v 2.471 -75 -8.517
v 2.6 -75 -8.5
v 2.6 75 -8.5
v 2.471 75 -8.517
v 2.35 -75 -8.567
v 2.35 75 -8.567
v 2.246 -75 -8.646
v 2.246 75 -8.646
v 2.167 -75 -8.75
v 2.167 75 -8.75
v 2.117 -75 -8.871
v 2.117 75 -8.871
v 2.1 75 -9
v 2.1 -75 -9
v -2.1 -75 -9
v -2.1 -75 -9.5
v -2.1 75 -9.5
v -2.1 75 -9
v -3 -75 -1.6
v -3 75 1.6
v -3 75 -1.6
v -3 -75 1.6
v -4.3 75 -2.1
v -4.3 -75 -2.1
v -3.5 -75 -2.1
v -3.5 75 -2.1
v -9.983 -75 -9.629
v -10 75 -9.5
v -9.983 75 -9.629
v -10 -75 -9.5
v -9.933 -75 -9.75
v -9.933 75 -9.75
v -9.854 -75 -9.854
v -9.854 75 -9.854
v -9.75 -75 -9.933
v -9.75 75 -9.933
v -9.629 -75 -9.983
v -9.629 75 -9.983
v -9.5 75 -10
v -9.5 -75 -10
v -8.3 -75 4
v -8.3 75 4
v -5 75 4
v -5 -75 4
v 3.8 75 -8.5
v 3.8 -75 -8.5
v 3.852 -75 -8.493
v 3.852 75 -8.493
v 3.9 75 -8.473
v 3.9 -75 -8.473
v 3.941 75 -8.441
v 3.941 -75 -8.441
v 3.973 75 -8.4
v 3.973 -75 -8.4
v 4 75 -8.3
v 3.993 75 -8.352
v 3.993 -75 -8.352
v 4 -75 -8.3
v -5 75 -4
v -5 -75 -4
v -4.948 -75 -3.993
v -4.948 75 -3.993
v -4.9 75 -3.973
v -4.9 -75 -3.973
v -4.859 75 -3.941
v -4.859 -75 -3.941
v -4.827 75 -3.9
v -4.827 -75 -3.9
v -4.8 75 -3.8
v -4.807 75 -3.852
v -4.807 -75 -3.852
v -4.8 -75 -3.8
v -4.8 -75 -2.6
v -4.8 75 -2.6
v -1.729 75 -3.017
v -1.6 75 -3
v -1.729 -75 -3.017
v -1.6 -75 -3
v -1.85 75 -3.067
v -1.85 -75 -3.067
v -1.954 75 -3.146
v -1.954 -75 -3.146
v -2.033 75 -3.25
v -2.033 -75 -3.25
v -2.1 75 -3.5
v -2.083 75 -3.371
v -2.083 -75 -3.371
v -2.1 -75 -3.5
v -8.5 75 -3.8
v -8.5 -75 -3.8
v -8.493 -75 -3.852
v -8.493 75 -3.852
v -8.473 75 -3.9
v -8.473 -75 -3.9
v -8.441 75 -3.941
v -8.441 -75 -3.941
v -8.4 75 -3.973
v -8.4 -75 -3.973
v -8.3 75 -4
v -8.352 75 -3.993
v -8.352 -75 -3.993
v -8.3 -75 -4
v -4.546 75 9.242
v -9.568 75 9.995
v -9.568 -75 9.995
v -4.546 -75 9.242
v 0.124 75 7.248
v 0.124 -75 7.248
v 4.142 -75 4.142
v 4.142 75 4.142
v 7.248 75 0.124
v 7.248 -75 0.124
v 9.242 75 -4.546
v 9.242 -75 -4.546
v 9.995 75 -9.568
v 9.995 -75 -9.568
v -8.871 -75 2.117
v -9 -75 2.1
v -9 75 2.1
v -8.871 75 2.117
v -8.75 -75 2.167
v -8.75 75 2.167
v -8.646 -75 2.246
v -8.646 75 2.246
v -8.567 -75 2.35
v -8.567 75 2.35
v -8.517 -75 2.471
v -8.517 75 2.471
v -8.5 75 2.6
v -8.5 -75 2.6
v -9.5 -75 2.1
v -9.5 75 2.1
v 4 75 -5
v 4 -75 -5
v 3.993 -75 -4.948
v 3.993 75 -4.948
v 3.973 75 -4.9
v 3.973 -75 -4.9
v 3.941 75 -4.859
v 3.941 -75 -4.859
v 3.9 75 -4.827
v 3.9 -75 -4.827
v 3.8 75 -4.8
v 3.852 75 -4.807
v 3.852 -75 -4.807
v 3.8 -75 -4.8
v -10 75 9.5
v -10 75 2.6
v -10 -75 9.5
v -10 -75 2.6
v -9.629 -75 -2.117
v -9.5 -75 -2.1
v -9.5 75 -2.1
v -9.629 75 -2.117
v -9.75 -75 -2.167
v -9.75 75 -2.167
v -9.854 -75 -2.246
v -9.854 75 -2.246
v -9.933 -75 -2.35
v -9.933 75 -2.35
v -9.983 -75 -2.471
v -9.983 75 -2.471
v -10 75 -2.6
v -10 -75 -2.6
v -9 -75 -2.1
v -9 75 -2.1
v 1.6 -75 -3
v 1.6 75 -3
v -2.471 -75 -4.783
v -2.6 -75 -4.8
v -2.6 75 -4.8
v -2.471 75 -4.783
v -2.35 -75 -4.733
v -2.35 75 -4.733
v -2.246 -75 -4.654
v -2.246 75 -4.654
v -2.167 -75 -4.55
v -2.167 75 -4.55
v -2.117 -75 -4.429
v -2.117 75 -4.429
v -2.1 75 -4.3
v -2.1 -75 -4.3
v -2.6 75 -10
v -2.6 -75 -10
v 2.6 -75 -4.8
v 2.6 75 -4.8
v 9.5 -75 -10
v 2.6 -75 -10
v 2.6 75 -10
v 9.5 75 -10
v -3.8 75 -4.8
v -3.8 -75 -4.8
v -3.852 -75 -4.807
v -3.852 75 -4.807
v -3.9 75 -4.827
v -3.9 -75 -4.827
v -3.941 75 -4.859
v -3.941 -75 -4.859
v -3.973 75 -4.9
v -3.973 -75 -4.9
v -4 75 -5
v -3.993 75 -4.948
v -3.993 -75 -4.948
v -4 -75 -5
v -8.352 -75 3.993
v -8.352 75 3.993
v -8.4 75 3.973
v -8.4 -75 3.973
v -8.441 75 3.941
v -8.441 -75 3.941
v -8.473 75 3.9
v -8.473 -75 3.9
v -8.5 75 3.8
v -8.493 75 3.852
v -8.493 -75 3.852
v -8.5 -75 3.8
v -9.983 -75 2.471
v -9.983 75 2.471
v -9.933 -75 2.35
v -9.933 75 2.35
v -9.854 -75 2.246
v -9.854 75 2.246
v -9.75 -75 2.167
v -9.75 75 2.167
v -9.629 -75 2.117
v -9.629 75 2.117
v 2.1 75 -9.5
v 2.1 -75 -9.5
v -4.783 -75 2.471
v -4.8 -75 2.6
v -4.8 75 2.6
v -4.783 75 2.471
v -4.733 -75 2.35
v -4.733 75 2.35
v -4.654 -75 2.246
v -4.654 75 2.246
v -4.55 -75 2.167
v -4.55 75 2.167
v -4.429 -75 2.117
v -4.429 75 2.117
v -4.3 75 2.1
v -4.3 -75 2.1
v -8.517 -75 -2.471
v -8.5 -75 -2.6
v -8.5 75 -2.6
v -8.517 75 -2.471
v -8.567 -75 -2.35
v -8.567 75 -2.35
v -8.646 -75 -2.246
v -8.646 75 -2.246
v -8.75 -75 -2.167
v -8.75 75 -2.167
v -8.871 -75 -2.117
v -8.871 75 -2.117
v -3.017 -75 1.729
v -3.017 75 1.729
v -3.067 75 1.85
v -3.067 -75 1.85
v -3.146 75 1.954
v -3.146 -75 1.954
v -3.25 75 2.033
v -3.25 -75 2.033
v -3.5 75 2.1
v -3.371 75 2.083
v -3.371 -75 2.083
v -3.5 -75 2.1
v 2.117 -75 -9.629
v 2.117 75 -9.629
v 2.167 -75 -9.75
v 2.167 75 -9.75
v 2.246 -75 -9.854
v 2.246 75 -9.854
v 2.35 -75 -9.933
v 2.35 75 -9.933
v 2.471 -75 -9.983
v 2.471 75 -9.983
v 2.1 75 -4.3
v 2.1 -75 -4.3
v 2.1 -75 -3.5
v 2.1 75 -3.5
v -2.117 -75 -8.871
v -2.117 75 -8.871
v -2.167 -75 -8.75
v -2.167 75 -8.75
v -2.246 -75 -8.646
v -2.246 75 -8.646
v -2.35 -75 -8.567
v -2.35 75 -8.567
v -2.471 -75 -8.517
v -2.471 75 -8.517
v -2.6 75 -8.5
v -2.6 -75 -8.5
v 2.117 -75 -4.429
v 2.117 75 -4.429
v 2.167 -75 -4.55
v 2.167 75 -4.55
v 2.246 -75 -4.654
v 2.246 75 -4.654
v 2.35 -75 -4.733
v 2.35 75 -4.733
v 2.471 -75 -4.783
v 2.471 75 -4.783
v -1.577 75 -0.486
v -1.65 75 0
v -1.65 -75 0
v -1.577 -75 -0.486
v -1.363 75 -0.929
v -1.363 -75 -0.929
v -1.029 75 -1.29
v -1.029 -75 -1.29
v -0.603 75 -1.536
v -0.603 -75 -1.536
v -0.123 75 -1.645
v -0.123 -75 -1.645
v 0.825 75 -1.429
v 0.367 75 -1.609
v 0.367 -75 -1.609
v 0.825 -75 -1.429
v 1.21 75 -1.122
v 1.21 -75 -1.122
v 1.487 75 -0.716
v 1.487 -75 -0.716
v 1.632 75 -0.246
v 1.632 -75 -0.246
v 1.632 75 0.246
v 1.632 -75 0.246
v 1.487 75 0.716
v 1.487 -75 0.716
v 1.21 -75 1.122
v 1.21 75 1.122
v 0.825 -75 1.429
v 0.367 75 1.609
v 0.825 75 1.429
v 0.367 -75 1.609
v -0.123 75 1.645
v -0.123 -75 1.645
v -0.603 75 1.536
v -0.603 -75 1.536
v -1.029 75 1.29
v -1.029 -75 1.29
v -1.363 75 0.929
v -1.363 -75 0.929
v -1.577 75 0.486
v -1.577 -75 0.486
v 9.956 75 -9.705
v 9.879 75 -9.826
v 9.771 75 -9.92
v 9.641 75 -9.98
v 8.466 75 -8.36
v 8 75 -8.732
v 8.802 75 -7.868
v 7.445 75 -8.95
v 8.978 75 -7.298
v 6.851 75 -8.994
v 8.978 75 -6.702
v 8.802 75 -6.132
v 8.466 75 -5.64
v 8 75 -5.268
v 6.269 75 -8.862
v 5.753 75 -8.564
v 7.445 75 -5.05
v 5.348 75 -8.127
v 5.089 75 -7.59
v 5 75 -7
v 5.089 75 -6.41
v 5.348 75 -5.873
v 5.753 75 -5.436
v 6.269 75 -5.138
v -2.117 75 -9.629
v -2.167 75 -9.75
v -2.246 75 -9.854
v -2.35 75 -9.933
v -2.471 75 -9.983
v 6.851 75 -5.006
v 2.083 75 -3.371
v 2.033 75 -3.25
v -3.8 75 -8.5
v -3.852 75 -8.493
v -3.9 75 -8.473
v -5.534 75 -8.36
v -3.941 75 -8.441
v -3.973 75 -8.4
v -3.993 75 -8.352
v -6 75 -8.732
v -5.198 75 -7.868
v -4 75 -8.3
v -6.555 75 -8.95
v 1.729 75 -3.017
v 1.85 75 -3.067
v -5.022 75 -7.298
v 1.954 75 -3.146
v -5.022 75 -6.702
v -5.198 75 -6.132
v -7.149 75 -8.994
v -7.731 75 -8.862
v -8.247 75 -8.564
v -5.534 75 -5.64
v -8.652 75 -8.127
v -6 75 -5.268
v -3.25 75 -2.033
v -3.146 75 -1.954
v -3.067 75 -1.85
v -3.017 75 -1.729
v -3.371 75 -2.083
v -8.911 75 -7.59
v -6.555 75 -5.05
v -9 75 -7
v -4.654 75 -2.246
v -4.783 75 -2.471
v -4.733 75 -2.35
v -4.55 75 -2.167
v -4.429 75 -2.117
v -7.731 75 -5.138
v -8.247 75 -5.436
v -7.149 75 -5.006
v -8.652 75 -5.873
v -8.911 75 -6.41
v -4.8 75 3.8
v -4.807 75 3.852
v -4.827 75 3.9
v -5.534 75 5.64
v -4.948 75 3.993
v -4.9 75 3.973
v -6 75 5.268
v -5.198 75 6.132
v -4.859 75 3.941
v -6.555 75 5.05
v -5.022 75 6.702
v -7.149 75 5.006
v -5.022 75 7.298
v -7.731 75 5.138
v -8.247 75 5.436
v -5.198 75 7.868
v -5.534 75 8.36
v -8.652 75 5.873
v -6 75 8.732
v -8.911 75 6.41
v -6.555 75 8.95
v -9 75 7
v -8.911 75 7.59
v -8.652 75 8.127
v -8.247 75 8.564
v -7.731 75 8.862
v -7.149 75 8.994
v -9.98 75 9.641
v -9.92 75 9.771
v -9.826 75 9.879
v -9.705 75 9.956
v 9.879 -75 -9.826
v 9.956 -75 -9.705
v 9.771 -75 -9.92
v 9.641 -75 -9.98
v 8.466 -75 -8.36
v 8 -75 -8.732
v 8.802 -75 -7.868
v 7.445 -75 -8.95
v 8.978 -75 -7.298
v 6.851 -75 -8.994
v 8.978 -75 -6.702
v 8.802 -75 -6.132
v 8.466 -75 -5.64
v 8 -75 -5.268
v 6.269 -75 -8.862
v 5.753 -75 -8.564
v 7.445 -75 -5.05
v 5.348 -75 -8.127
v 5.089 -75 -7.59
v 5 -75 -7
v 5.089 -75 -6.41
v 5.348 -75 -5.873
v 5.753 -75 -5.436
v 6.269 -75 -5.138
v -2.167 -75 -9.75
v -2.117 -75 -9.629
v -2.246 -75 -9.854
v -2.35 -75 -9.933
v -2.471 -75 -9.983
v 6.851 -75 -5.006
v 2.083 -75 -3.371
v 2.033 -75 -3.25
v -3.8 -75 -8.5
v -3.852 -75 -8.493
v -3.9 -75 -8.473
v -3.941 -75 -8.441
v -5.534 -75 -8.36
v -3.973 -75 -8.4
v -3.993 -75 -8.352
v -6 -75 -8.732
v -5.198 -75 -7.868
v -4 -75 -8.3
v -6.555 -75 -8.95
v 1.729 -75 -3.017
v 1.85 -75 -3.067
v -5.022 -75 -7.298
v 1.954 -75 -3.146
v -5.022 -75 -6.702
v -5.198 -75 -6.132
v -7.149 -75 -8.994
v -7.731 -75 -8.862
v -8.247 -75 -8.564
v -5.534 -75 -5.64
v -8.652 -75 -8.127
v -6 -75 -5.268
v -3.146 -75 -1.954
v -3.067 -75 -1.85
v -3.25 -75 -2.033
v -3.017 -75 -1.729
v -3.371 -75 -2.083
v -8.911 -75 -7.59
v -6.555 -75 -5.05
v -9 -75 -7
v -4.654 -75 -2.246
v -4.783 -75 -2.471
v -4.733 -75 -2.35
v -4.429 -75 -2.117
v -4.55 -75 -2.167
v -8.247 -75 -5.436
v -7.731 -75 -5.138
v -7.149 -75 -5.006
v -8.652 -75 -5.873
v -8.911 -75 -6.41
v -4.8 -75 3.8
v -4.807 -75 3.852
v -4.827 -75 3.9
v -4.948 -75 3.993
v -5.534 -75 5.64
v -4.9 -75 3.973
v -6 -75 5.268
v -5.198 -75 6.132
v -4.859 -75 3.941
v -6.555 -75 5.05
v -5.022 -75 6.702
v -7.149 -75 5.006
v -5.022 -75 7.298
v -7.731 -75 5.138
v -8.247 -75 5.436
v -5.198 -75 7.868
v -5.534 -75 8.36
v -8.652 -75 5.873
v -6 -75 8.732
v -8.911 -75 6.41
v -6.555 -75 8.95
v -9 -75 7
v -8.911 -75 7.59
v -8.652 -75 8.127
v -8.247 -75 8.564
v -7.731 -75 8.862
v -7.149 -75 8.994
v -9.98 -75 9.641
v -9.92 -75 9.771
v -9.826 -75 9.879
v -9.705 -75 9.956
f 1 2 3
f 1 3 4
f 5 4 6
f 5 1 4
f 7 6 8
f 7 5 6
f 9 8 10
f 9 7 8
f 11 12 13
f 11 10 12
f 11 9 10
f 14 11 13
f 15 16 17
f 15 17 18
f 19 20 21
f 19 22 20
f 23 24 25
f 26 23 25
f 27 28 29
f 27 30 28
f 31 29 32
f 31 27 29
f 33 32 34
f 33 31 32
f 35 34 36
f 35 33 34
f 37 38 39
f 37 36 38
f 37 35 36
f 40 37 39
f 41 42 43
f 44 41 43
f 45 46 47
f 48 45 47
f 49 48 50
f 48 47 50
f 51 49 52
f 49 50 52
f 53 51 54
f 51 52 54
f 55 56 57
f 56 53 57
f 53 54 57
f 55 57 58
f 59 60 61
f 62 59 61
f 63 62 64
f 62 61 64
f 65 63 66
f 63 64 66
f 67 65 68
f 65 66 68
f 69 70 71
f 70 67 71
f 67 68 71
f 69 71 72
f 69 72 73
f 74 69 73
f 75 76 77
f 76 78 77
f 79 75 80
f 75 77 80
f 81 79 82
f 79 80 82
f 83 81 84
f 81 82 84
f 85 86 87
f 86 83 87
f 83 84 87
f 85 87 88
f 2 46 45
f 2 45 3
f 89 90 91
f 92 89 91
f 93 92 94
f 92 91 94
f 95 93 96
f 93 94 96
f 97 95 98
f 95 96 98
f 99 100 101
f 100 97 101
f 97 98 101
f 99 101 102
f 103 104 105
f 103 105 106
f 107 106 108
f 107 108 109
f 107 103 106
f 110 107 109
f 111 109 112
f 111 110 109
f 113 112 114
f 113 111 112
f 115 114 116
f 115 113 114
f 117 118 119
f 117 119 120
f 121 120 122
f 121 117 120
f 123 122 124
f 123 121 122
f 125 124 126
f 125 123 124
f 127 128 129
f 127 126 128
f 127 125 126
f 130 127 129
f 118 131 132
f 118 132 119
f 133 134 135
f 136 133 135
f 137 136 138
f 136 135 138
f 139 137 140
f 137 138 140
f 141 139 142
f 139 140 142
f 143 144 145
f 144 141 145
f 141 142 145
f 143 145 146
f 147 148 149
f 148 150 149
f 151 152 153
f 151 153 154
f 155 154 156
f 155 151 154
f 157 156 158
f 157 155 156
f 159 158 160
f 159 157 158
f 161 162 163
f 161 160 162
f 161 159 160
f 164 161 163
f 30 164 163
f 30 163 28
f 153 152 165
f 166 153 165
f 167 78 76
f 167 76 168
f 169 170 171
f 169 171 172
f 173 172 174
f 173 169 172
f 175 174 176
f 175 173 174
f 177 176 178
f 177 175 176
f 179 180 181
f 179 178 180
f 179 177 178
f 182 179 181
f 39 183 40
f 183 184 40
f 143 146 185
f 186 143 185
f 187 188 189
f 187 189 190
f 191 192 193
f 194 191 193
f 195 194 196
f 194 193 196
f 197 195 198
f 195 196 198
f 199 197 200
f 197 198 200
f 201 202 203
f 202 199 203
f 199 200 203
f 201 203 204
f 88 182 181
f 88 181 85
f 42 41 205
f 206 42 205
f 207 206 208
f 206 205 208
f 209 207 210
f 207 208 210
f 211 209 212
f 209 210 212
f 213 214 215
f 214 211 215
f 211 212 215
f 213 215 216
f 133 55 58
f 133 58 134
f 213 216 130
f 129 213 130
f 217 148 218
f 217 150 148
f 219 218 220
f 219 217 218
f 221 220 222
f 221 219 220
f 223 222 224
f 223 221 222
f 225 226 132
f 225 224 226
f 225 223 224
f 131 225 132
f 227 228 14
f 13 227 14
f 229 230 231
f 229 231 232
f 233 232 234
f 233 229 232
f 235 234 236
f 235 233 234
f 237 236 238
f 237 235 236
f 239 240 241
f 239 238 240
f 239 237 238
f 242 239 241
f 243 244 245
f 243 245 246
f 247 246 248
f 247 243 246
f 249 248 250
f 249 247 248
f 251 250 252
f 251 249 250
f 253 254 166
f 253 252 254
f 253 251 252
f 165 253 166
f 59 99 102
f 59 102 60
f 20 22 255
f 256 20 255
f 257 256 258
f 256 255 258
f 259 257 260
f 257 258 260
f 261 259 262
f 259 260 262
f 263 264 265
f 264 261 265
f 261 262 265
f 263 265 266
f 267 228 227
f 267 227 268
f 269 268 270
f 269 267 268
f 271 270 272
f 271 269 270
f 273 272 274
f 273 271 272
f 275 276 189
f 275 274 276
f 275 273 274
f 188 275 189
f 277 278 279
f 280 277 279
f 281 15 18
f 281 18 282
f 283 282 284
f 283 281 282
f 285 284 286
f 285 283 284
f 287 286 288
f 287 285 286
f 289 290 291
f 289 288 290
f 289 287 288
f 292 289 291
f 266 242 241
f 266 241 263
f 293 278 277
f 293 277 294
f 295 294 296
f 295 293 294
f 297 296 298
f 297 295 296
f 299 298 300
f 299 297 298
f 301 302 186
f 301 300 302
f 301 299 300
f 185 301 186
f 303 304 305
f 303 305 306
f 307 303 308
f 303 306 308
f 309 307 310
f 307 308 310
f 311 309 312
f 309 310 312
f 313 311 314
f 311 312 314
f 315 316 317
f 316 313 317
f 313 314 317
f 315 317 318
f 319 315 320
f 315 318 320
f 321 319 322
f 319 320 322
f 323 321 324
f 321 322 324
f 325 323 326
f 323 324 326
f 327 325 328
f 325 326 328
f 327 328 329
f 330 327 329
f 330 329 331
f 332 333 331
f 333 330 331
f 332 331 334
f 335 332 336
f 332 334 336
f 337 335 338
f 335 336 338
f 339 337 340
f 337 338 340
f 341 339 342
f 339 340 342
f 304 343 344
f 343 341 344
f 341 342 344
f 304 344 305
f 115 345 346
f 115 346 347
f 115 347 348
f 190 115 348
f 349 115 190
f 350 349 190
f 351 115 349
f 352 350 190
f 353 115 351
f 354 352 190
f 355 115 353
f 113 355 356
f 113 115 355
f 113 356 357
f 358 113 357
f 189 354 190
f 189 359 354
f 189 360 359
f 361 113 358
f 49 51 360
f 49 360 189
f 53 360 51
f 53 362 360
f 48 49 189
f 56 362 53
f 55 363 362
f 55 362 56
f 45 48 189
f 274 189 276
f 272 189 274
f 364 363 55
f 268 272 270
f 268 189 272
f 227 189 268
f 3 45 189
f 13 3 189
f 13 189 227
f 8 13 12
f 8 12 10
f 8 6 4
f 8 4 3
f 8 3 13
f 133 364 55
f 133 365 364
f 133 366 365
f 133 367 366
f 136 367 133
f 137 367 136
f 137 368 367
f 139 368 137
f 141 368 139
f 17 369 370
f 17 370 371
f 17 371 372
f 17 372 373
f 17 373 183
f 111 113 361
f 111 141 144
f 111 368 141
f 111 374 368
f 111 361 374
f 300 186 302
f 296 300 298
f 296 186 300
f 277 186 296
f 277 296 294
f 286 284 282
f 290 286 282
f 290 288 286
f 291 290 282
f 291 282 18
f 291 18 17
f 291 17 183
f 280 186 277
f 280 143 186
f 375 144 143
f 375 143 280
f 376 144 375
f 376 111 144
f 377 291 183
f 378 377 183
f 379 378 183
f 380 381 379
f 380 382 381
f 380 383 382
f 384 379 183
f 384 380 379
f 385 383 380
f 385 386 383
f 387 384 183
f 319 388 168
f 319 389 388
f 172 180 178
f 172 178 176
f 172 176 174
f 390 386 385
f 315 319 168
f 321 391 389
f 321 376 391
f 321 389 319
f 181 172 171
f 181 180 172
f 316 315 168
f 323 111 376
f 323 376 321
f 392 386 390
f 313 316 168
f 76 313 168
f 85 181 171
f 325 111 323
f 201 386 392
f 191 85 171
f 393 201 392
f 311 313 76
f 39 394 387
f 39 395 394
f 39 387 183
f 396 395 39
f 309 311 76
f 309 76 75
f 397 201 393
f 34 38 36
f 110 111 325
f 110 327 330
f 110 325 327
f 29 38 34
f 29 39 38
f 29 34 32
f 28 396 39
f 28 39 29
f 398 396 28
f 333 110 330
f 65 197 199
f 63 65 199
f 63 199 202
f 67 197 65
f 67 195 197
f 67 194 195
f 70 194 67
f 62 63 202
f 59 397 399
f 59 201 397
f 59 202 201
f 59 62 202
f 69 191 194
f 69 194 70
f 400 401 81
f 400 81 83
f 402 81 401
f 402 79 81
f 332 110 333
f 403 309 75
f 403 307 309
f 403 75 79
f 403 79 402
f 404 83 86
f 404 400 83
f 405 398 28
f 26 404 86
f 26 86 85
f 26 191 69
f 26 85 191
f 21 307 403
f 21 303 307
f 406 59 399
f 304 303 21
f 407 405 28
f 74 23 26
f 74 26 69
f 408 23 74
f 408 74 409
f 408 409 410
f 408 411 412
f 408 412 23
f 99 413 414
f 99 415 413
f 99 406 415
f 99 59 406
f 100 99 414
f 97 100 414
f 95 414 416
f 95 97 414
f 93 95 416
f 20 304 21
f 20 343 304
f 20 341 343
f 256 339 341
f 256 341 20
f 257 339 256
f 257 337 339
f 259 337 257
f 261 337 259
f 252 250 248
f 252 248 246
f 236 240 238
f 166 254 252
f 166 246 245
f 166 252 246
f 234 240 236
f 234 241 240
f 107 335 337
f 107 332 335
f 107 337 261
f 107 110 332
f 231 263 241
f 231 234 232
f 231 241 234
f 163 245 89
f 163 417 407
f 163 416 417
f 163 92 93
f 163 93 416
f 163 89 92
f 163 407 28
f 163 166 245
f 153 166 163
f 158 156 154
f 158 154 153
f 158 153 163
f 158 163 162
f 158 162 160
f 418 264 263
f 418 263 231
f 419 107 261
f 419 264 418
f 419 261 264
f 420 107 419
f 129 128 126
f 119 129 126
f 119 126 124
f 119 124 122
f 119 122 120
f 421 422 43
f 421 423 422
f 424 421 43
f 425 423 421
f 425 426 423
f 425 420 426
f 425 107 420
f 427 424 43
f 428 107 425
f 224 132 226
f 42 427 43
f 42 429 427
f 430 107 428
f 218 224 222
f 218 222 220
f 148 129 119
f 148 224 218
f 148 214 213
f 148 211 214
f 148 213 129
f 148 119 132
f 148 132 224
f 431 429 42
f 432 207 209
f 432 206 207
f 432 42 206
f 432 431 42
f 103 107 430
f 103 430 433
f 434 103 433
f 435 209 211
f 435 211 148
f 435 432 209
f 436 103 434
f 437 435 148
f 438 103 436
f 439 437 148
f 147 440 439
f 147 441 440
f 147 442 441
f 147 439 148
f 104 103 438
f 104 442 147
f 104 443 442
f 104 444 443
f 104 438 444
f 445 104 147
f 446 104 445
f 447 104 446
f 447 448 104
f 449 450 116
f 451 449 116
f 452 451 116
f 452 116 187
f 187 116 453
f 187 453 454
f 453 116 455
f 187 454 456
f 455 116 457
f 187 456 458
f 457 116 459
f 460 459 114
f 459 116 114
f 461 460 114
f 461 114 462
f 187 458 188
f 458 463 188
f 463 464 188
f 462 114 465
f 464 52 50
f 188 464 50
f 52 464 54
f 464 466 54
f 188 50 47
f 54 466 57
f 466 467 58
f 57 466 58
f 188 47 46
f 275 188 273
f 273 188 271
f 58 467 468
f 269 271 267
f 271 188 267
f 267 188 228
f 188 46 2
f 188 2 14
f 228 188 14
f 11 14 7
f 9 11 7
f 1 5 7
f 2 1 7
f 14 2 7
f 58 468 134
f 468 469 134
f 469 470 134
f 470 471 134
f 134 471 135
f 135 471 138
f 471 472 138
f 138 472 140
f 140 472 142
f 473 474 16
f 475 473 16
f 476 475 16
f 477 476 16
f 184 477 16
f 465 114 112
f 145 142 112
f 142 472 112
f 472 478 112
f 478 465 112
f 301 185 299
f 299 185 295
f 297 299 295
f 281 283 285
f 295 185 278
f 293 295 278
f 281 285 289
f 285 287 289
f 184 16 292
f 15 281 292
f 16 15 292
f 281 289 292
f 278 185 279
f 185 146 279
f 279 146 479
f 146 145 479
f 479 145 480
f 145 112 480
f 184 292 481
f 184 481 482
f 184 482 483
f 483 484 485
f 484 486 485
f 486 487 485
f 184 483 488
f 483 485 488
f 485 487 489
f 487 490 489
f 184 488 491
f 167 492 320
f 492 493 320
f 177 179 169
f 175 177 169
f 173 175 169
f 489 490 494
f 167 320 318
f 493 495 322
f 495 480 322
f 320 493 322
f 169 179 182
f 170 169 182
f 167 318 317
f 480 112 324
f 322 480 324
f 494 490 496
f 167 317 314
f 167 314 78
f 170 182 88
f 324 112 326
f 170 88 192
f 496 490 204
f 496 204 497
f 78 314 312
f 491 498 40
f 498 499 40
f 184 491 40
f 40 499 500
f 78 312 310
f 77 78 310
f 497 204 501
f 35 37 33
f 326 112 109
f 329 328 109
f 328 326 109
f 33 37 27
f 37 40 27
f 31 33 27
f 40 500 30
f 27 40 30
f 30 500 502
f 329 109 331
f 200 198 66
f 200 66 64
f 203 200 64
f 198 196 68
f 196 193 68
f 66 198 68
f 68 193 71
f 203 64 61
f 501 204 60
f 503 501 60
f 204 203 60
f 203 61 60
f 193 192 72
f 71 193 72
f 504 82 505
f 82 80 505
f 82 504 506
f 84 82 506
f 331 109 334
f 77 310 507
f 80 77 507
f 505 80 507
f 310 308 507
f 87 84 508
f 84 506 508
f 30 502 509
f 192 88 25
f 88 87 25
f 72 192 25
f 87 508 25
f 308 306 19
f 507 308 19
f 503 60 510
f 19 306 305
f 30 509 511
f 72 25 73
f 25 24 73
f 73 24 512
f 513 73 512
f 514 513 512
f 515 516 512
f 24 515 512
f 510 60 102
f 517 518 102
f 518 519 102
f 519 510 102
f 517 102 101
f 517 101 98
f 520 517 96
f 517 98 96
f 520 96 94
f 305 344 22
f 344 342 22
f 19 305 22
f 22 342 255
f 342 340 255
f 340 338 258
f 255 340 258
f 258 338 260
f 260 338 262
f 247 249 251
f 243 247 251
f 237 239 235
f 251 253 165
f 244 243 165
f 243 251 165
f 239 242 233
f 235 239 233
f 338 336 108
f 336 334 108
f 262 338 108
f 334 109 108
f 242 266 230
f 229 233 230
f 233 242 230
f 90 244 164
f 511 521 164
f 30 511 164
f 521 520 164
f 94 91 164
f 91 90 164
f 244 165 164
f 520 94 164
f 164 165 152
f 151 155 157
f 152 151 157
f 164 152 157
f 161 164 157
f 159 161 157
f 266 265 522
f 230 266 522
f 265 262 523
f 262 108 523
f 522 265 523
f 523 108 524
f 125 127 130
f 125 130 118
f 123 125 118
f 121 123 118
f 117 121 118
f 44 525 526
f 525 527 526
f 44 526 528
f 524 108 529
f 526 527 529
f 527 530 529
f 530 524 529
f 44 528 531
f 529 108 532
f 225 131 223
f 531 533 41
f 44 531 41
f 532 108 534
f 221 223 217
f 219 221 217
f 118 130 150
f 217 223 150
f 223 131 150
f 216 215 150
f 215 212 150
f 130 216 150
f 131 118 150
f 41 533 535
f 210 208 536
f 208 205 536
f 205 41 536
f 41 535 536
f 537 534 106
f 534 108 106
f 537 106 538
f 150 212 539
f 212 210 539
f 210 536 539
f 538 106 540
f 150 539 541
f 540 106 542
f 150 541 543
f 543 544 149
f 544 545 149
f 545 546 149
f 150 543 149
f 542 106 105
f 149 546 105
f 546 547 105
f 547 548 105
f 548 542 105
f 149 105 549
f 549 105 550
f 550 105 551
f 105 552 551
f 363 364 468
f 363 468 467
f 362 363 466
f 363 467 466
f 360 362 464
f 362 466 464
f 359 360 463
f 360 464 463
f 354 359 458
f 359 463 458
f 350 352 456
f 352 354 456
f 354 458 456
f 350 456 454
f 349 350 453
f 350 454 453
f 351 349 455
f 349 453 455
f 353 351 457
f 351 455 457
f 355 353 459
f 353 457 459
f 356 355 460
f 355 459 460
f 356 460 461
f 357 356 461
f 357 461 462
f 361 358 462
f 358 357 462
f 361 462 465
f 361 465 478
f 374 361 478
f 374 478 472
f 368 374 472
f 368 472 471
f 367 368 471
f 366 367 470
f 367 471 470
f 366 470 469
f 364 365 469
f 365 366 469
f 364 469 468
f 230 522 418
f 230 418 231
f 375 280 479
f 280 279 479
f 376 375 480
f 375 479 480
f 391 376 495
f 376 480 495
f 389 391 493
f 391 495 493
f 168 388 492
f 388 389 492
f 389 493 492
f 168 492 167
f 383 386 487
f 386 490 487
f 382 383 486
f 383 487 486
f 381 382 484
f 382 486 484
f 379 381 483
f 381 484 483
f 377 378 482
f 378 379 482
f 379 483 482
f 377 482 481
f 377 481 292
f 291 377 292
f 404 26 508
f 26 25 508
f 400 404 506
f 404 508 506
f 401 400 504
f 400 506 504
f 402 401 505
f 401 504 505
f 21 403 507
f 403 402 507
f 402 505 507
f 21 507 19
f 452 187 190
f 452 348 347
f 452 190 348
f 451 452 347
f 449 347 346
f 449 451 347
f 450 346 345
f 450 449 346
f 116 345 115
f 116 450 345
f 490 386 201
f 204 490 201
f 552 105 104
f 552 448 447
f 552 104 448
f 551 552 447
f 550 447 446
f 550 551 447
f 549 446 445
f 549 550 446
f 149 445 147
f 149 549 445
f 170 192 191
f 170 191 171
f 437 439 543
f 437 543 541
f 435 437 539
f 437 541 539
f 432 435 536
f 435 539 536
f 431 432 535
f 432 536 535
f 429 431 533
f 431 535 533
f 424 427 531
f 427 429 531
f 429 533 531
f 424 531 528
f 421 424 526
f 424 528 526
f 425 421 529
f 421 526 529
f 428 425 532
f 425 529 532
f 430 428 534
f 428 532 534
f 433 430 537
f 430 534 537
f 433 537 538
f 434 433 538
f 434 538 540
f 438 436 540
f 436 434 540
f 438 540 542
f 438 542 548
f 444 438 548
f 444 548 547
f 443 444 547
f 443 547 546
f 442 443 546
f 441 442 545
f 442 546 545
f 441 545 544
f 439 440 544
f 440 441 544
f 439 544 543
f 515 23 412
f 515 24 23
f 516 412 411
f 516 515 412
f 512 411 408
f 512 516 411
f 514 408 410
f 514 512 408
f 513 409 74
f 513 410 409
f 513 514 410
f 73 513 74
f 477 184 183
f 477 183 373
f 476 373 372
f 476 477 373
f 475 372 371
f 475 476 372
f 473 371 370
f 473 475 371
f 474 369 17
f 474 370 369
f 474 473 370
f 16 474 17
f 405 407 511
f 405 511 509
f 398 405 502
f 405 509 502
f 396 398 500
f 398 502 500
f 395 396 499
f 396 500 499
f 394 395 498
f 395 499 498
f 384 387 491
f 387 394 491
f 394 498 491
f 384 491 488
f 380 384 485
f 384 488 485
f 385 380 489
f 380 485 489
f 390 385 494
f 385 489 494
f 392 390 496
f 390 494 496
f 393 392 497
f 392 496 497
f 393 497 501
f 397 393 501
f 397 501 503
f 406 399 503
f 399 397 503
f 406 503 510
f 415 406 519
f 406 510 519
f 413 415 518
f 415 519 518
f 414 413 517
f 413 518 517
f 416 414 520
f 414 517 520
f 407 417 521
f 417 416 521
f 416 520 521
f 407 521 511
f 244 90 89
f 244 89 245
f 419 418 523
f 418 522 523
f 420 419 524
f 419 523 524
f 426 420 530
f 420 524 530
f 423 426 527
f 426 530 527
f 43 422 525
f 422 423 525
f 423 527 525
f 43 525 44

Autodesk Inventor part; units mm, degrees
ref_plane "YZ Plane" through (0, 0, 0) normal (1, 0, 0) x (0, 1, 0)
ref_plane "XZ Plane" through (0, 0, 0) normal (0, 1, 0) x (-1, 0, 0)
ref_plane "XY Plane" through (0, 0, 0) normal (0, 0, 1) x (1, 0, 0)
sketch "スケッチ" plane through (0, 0, 0) normal (0, 1, 0) x (-1, 0, 0)
  line L0 (8.5, -3.8) -> (8.5, -2.6)
  line L1 (4, -8.3) -> (4, -5)
  circle A0 centre (7, -7) radius 2
  line L2 (10, -2.6) -> (10, -9.5)
  line L3 (2.6, -10) -> (9.5, -10)
  line L4 (2.1, -9.5) -> (2.1, -9)
  line L5 (8.5, -2.1) -> (8.5, -4)
  line L6 (3.8, -4.8) -> (2.6, -4.8)
  line L7 (4.8, -3.8) -> (4.8, -2.6)
  arc A1 (2.1, -4.3) -> (2.6, -4.8) centre (2.6, -4.3) ccw
  arc A2 (2.6, -8.5) -> (2.1, -9) centre (2.6, -9) ccw
  arc A3 (3.8, -8.5) -> (4, -8.3) centre (3.8, -8.3) ccw
  arc A4 (4, -5) -> (3.8, -4.8) centre (3.8, -5) ccw
  arc A5 (2.1, -3.5) -> (1.6, -3) centre (1.6, -3.5) ccw
  arc A6 (2.1, -9.5) -> (2.6, -10) centre (2.6, -9.5) ccw
  arc A7 (9.5, -10) -> (10, -9.5) centre (9.5, -9.5) ccw
  arc A8 (10, -2.6) -> (9.5, -2.1) centre (9.5, -2.6) ccw
  arc A9 (9, -2.1) -> (8.5, -2.6) centre (9, -2.6) ccw
  arc A10 (8.3, -4) -> (8.5, -3.8) centre (8.3, -3.8) ccw
  arc A11 (4.8, -3.8) -> (5, -4) centre (5, -3.8) ccw
  line L8 (4.3, -2.1) -> (3.5, -2.1)
  arc A12 (4.8, -2.6) -> (4.3, -2.1) centre (4.3, -2.6) ccw
  arc A13 (3, -1.6) -> (3.5, -2.1) centre (3.5, -1.6) ccw
  line L9 (2.1, -4.3) -> (2.1, -3.5)
  line L10 (3.8, -8.5) -> (2.6, -8.5)
  line L11 (9.5, -2.1) -> (9, -2.1)
  line L12 (8.3, -4) -> (5, -4)
  circle A14 centre (0, 0) radius 1.65
  arc A15 (8.5, 2.6) -> (9, 2.1) centre (9, 2.6) ccw
  line L13 (8.5, 3.8) -> (8.5, 2.6)
  arc A16 (8.5, 3.8) -> (8.3, 4) centre (8.3, 3.8) ccw
  line L14 (8.3, 4) -> (5, 4)
  line L15 (10, 2.6) -> (10, 9.5)
  arc A17 (10, 9.5) -> (9.5, 10) centre (9.5, 9.5) ccw
  circle A18 centre (7, 7) radius 2
  line L16 (4, 8.3) -> (4, 5)
  line L17 (2.6, 10) -> (9.5, 10)
  line L18 (9.5, 2.1) -> (9, 2.1)
  arc A19 (9.5, 2.1) -> (10, 2.6) centre (9.5, 2.6) ccw
  line L19 (3.8, 8.5) -> (2.6, 8.5)
  line L20 (4.8, 3.8) -> (4.8, 2.6)
  arc A20 (4.3, 2.1) -> (4.8, 2.6) centre (4.3, 2.6) ccw
  line L21 (2.1, 8.5) -> (4, 8.5)
  arc A21 (4, 8.3) -> (3.8, 8.5) centre (3.8, 8.3) ccw
  arc A22 (2.1, 9) -> (2.6, 8.5) centre (2.6, 9) ccw
  arc A23 (2.6, 10) -> (2.1, 9.5) centre (2.6, 9.5) ccw
  line L22 (2.1, 9.5) -> (2.1, 9)
  arc A24 (1.6, 3) -> (2.1, 3.5) centre (1.6, 3.5) ccw
  line L23 (3.8, 4.8) -> (2.6, 4.8)
  arc A25 (5, 4) -> (4.8, 3.8) centre (5, 3.8) ccw
  arc A26 (3.8, 4.8) -> (4, 5) centre (3.8, 5) ccw
  line L24 (4.3, 2.1) -> (3.5, 2.1)
  arc A27 (2.6, 4.8) -> (2.1, 4.3) centre (2.6, 4.3) ccw
  line L25 (2.1, 4.3) -> (2.1, 3.5)
  arc A28 (3.5, 2.1) -> (3, 1.6) centre (3.5, 1.6) ccw
  arc A29 (-2.6, 8.5) -> (-2.1, 9) centre (-2.6, 9) ccw
  line L26 (-3.8, 8.5) -> (-2.6, 8.5)
  arc A30 (-3.8, 8.5) -> (-4, 8.3) centre (-3.8, 8.3) ccw
  line L27 (-4, 8.3) -> (-4, 5)
  line L28 (-2.6, 10) -> (-9.5, 10)
  arc A31 (-9.5, 10) -> (-10, 9.5) centre (-9.5, 9.5) ccw
  circle A32 centre (-7, 7) radius 2
  line L29 (-8.3, 4) -> (-5, 4)
  line L30 (-10, 2.6) -> (-10, 9.5)
  line L31 (-2.1, 9.5) -> (-2.1, 9)
  arc A33 (-2.1, 9.5) -> (-2.6, 10) centre (-2.6, 9.5) ccw
  line L32 (-8.5, 3.8) -> (-8.5, 2.6)
  line L33 (-3.8, 4.8) -> (-2.6, 4.8)
  arc A34 (-2.1, 4.3) -> (-2.6, 4.8) centre (-2.6, 4.3) ccw
  line L34 (-8.5, 2.1) -> (-8.5, 4)
  arc A35 (-8.3, 4) -> (-8.5, 3.8) centre (-8.3, 3.8) ccw
  arc A36 (-9, 2.1) -> (-8.5, 2.6) centre (-9, 2.6) ccw
  arc A37 (-10, 2.6) -> (-9.5, 2.1) centre (-9.5, 2.6) ccw
  line L35 (-9.5, 2.1) -> (-9, 2.1)
  arc A38 (-3, 1.6) -> (-3.5, 2.1) centre (-3.5, 1.6) ccw
  line L36 (-4.8, 3.8) -> (-4.8, 2.6)
  arc A39 (-4, 5) -> (-3.8, 4.8) centre (-3.8, 5) ccw
  arc A40 (-4.8, 3.8) -> (-5, 4) centre (-5, 3.8) ccw
  line L37 (-2.1, 4.3) -> (-2.1, 3.5)
  arc A41 (-4.8, 2.6) -> (-4.3, 2.1) centre (-4.3, 2.6) ccw
  line L38 (-4.3, 2.1) -> (-3.5, 2.1)
  arc A42 (-2.1, 3.5) -> (-1.6, 3) centre (-1.6, 3.5) ccw
  arc A43 (-8.5, -2.6) -> (-9, -2.1) centre (-9, -2.6) ccw
  line L39 (-8.5, -3.8) -> (-8.5, -2.6)
  arc A44 (-8.5, -3.8) -> (-8.3, -4) centre (-8.3, -3.8) ccw
  line L40 (-8.3, -4) -> (-5, -4)
  line L41 (-10, -2.6) -> (-10, -9.5)
  arc A45 (-10, -9.5) -> (-9.5, -10) centre (-9.5, -9.5) ccw
  circle A46 centre (-7, -7) radius 2
  line L42 (-4, -8.3) -> (-4, -5)
  line L43 (-2.6, -10) -> (-9.5, -10)
  line L44 (-9.5, -2.1) -> (-9, -2.1)
  arc A47 (-9.5, -2.1) -> (-10, -2.6) centre (-9.5, -2.6) ccw
  line L45 (-3.8, -8.5) -> (-2.6, -8.5)
  line L46 (-4.8, -3.8) -> (-4.8, -2.6)
  arc A48 (-4.3, -2.1) -> (-4.8, -2.6) centre (-4.3, -2.6) ccw
  line L47 (-2.1, -8.5) -> (-4, -8.5)
  arc A49 (-4, -8.3) -> (-3.8, -8.5) centre (-3.8, -8.3) ccw
  arc A50 (-2.1, -9) -> (-2.6, -8.5) centre (-2.6, -9) ccw
  arc A51 (-2.6, -10) -> (-2.1, -9.5) centre (-2.6, -9.5) ccw
  line L48 (-2.1, -9.5) -> (-2.1, -9)
  arc A52 (-1.6, -3) -> (-2.1, -3.5) centre (-1.6, -3.5) ccw
  line L49 (-3.8, -4.8) -> (-2.6, -4.8)
  arc A53 (-5, -4) -> (-4.8, -3.8) centre (-5, -3.8) ccw
  arc A54 (-3.8, -4.8) -> (-4, -5) centre (-3.8, -5) ccw
  line L50 (-4.3, -2.1) -> (-3.5, -2.1)
  arc A55 (-2.6, -4.8) -> (-2.1, -4.3) centre (-2.6, -4.3) ccw
  line L51 (-2.1, -4.3) -> (-2.1, -3.5)
  arc A56 (-3.5, -2.1) -> (-3, -1.6) centre (-3.5, -1.6) ccw
  line L52 (1.6, -3) -> (-1.6, -3)
  line L53 (-3, -1.6) -> (-3, 1.6)
  line L54 (-1.6, 3) -> (1.6, 3)
  line L55 (3, 1.6) -> (3, -1.6)
  point P0 (2.1, -10)
  point P1 (10, 2.1)
  point P2 (-2.1, 10)
  point P3 (-10, -2.1)
  dimension "d12" = 4
  dimension "d14" = 3.7
  dimension "d16" = 0.5
  dimension "d17" = 0.5
  dimension "d18" = 0.2
  dimension "d19" = 0.5
  dimension "d20" = 0.5
  dimension "d24" = 0.5
  dimension "d25" = 0.2
  dimension "d28" = 0.5
  dimension "d31" = 1.5
  dimension "d36" = 3.7
  dimension "d37" = 1.5
  dimension "d58" = 3.3
  dimension "d65" = 10
  dimension "d67" = 2.1
  dimension "d68" = 2.1
  dimension "d69" = 1.9
  dimension "d70" = 7
  dimension "d72" = 2.1
  dimension "d73" = 2.1
  dimension "d74" = 1.9
  dimension "d75" = 7
  dimension "d76" = 10
  dimension "d80" = 360
  dimension "d82" = 3
extrude "ボディ" add sketch "スケッチ" along normal mid plane 150
sketch "スケッチ4" plane through (0, 0, 0) normal (0, 1, 0) x (-1, 0, 0)
  line L0 (0, 0) -> (10, 0)
ref_plane "作業平面4" through (0, 0, 0) normal (0, 0, -1) x (-1, 0, 0)
sketch "スケッチ5" plane through (0, 0, 0) normal (0, 0, -1) x (-1, 0, 0)
  line L0 (-2, 0) -> (12, 0)
  line L1 (-2, 150) -> (12, 150)
sketch "スケッチ9" plane through (2.6, 0, -10) normal (0, -1, 0) x (1, 0, 0)
  circle A0 centre (4.4, 3) radius 2 projected
  circle A1 centre (4.4, 17) radius 2 projected
  circle A2 centre (-9.6, 17) radius 2 projected
  circle A3 centre (-9.6, 3) radius 2 projected
  circle A4 centre (-2.6, 10) radius 1.65 projected
  arc A5 (-5.2, 5.2) -> (-4.7, 5.7) centre (-5.2, 5.7) ccw projected
  line L0 (-4.7, 5.7) -> (-4.7, 6.5) projected
  arc A6 (-4.2, 7) -> (-4.7, 6.5) centre (-4.2, 6.5) ccw projected
  line L1 (-4.2, 7) -> (-1, 7) projected
  arc A7 (-0.5, 6.5) -> (-1, 7) centre (-1, 6.5) ccw projected
  line L2 (-0.5, 6.5) -> (-0.5, 5.7) projected
  arc A8 (-0.5, 5.7) -> (0, 5.2) centre (0, 5.7) ccw projected
  line L3 (0, 5.2) -> (1.2, 5.2) projected
  arc A9 (1.4, 5) -> (1.2, 5.2) centre (1.2, 5) ccw projected
  line L4 (1.4, 5) -> (1.4, 1.7) projected
  arc A10 (1.2, 1.5) -> (1.4, 1.7) centre (1.2, 1.7) ccw projected
  line L5 (1.2, 1.5) -> (0, 1.5) projected
  arc A11 (0, 1.5) -> (-0.5, 1) centre (0, 1) ccw projected
  line L6 (-0.5, 1) -> (-0.5, 0.5) projected
  arc A12 (-0.5, 0.5) -> (0, 0) centre (0, 0.5) ccw projected
  line L7 (0, 0) -> (6.9, 0) projected
  arc A13 (6.9, 0) -> (7.4, 0.5) centre (6.9, 0.5) ccw projected
  line L8 (7.4, 0.5) -> (7.4, 7.4) projected
  arc A14 (7.4, 7.4) -> (6.9, 7.9) centre (6.9, 7.4) ccw projected
  line L9 (6.9, 7.9) -> (6.4, 7.9) projected
  arc A15 (6.4, 7.9) -> (5.9, 7.4) centre (6.4, 7.4) ccw projected
  line L10 (5.9, 7.4) -> (5.9, 6.2) projected
  arc A16 (5.7, 6) -> (5.9, 6.2) centre (5.7, 6.2) ccw projected
  line L11 (5.7, 6) -> (2.4, 6) projected
  arc A17 (2.2, 6.2) -> (2.4, 6) centre (2.4, 6.2) ccw projected
  line L12 (2.2, 6.2) -> (2.2, 7.4) projected
  arc A18 (2.2, 7.4) -> (1.7, 7.9) centre (1.7, 7.4) ccw projected
  line L13 (1.7, 7.9) -> (0.9, 7.9) projected
  arc A19 (0.4, 8.4) -> (0.9, 7.9) centre (0.9, 8.4) ccw projected
  line L14 (0.4, 8.4) -> (0.4, 11.6) projected
  arc A20 (0.9, 12.1) -> (0.4, 11.6) centre (0.9, 11.6) ccw projected
  line L15 (0.9, 12.1) -> (1.7, 12.1) projected
  arc A21 (1.7, 12.1) -> (2.2, 12.6) centre (1.7, 12.6) ccw projected
  line L16 (2.2, 12.6) -> (2.2, 13.8) projected
  arc A22 (2.4, 14) -> (2.2, 13.8) centre (2.4, 13.8) ccw projected
  line L17 (2.4, 14) -> (5.7, 14) projected
  arc A23 (5.9, 13.8) -> (5.7, 14) centre (5.7, 13.8) ccw projected
  line L18 (5.9, 13.8) -> (5.9, 12.6) projected
  arc A24 (5.9, 12.6) -> (6.4, 12.1) centre (6.4, 12.6) ccw projected
  line L19 (6.4, 12.1) -> (6.9, 12.1) projected
  arc A25 (6.9, 12.1) -> (7.4, 12.6) centre (6.9, 12.6) ccw projected
  line L20 (7.4, 12.6) -> (7.4, 19.5) projected
  arc A26 (7.4, 19.5) -> (6.9, 20) centre (6.9, 19.5) ccw projected
  line L21 (6.9, 20) -> (0, 20) projected
  arc A27 (0, 20) -> (-0.5, 19.5) centre (0, 19.5) ccw projected
  line L22 (-0.5, 19.5) -> (-0.5, 19) projected
  arc A28 (-0.5, 19) -> (0, 18.5) centre (0, 19) ccw projected
  line L23 (0, 18.5) -> (1.2, 18.5) projected
  arc A29 (1.4, 18.3) -> (1.2, 18.5) centre (1.2, 18.3) ccw projected
  line L24 (1.4, 18.3) -> (1.4, 15) projected
  arc A30 (1.2, 14.8) -> (1.4, 15) centre (1.2, 15) ccw projected
  line L25 (1.2, 14.8) -> (0, 14.8) projected
  arc A31 (0, 14.8) -> (-0.5, 14.3) centre (0, 14.3) ccw projected
  line L26 (-0.5, 14.3) -> (-0.5, 13.5) projected
  arc A32 (-1, 13) -> (-0.5, 13.5) centre (-1, 13.5) ccw projected
  line L27 (-1, 13) -> (-4.2, 13) projected
  arc A33 (-4.7, 13.5) -> (-4.2, 13) centre (-4.2, 13.5) ccw projected
  line L28 (-4.7, 13.5) -> (-4.7, 14.3) projected
  arc A34 (-4.7, 14.3) -> (-5.2, 14.8) centre (-5.2, 14.3) ccw projected
  line L29 (-5.2, 14.8) -> (-6.4, 14.8) projected
  arc A35 (-6.6, 15) -> (-6.4, 14.8) centre (-6.4, 15) ccw projected
  line L30 (-6.6, 15) -> (-6.6, 18.3) projected
  arc A36 (-6.4, 18.5) -> (-6.6, 18.3) centre (-6.4, 18.3) ccw projected
  line L31 (-6.4, 18.5) -> (-5.2, 18.5) projected
  arc A37 (-5.2, 18.5) -> (-4.7, 19) centre (-5.2, 19) ccw projected
  line L32 (-4.7, 19) -> (-4.7, 19.5) projected
  arc A38 (-4.7, 19.5) -> (-5.2, 20) centre (-5.2, 19.5) ccw projected
  line L33 (-5.2, 20) -> (-12.1, 20) projected
  arc A39 (-12.1, 20) -> (-12.6, 19.5) centre (-12.1, 19.5) ccw projected
  line L34 (-12.6, 19.5) -> (-12.6, 12.6) projected
  arc A40 (-12.6, 12.6) -> (-12.1, 12.1) centre (-12.1, 12.6) ccw projected
  line L35 (-12.1, 12.1) -> (-11.6, 12.1) projected
  arc A41 (-11.6, 12.1) -> (-11.1, 12.6) centre (-11.6, 12.6) ccw projected
  line L36 (-11.1, 12.6) -> (-11.1, 13.8) projected
  arc A42 (-10.9, 14) -> (-11.1, 13.8) centre (-10.9, 13.8) ccw projected
  line L37 (-10.9, 14) -> (-7.6, 14) projected
  arc A43 (-7.4, 13.8) -> (-7.6, 14) centre (-7.6, 13.8) ccw projected
  line L38 (-7.4, 13.8) -> (-7.4, 12.6) projected
  arc A44 (-7.4, 12.6) -> (-6.9, 12.1) centre (-6.9, 12.6) ccw projected
  line L39 (-6.9, 12.1) -> (-6.1, 12.1) projected
  arc A45 (-5.6, 11.6) -> (-6.1, 12.1) centre (-6.1, 11.6) ccw projected
  line L40 (-5.6, 11.6) -> (-5.6, 8.4) projected
  arc A46 (-6.1, 7.9) -> (-5.6, 8.4) centre (-6.1, 8.4) ccw projected
  line L41 (-6.1, 7.9) -> (-6.9, 7.9) projected
  arc A47 (-6.9, 7.9) -> (-7.4, 7.4) centre (-6.9, 7.4) ccw projected
  line L42 (-7.4, 7.4) -> (-7.4, 6.2) projected
  arc A48 (-7.6, 6) -> (-7.4, 6.2) centre (-7.6, 6.2) ccw projected
  line L43 (-7.6, 6) -> (-10.9, 6) projected
  arc A49 (-11.1, 6.2) -> (-10.9, 6) centre (-10.9, 6.2) ccw projected
  line L44 (-11.1, 6.2) -> (-11.1, 7.4) projected
  arc A50 (-11.1, 7.4) -> (-11.6, 7.9) centre (-11.6, 7.4) ccw projected
  line L45 (-11.6, 7.9) -> (-12.1, 7.9) projected
  arc A51 (-12.1, 7.9) -> (-12.6, 7.4) centre (-12.1, 7.4) ccw projected
  line L46 (-12.6, 7.4) -> (-12.6, 0.5) projected
  arc A52 (-12.6, 0.5) -> (-12.1, 0) centre (-12.1, 0.5) ccw projected
  line L47 (-12.1, 0) -> (-5.2, 0) projected
  arc A53 (-5.2, 0) -> (-4.7, 0.5) centre (-5.2, 0.5) ccw projected
  line L48 (-4.7, 0.5) -> (-4.7, 1) projected
  arc A54 (-4.7, 1) -> (-5.2, 1.5) centre (-5.2, 1) ccw projected
  line L49 (-5.2, 1.5) -> (-6.4, 1.5) projected
  arc A55 (-6.6, 1.7) -> (-6.4, 1.5) centre (-6.4, 1.7) ccw projected
  line L50 (-6.6, 1.7) -> (-6.6, 5) projected
  arc A56 (-6.4, 5.2) -> (-6.6, 5) centre (-6.4, 5) ccw projected
  line L51 (-6.4, 5.2) -> (-5.2, 5.2) projected
  line L52 (6.9, 20) -> (0, 20) projected
  line L53 (-5.2, 20) -> (0, 20)
  line L54 (7.4, 12.6) -> (7.4, 19.5) projected
  line L55 (7.4, 12.6) -> (7.4, 7.4)
extrude "押し出し7" add sketch "スケッチ9" along normal mid plane 150 contours A1 | A14 L9 A15 L10 A16 L11 A17 L12 A18 L13 A19 L14 A20 L15 A21 L16 A22 L17 A23 L18 A24 L19 A25 L55 | A27 L22 A28 L23 A29 L24 A30 L25 A31 L26 A32 L27 A33 L28 A34 L29 A35 L30 A36 L31 A37 L32 A38 L53
sketch "スケッチ10" plane through (-9.5, 0, 10) normal (0, -1, 0) x (1, 0, 0)
  line L0 (-0.5, -12.6) -> (-0.5, -19.5) construction
  line L1 (0, -20) -> (6.9, -20) construction
  arc A0 (-0.5, -19.5) -> (0, -20) centre (0, -19.5) ccw construction
  line L2 (-0.5, -19.5) -> (-0.5, -20) construction
  line L3 (-0.5, -20) -> (0, -20) construction
  arc A1 (0, 0) -> (-0.5, -0.5) centre (0, -0.5) ccw projected
  arc A2 (19.4953, -19.5681) -> (-0.0681, -0.0047) centre (-0.5, -20) ccw
  line L4 (19, 0) -> (0, 0) projected
  arc A3 (19.5, -0.5) -> (19, 0) centre (19, -0.5) ccw projected
  line L5 (19.5, -19.5) -> (19.5, -0.5) projected
  arc A4 (19, -20) -> (19.5, -19.5) centre (19, -19.5) ccw projected
  point P0 (9.5, -10)
  dimension "d101" = 20
extrude "押し出し8" cut sketch "スケッチ10" along normal through all both and the other way through all
equation "\"d99\" = Length"
equation "\"Length\" = 150"
equation "\"G_OFFSET_START\" = 0"
equation "\"G_OFFSET_END\" = 0"
equation "\"G_L\" = 150"
properties part number "r150" material "アルミニウム 6061"
